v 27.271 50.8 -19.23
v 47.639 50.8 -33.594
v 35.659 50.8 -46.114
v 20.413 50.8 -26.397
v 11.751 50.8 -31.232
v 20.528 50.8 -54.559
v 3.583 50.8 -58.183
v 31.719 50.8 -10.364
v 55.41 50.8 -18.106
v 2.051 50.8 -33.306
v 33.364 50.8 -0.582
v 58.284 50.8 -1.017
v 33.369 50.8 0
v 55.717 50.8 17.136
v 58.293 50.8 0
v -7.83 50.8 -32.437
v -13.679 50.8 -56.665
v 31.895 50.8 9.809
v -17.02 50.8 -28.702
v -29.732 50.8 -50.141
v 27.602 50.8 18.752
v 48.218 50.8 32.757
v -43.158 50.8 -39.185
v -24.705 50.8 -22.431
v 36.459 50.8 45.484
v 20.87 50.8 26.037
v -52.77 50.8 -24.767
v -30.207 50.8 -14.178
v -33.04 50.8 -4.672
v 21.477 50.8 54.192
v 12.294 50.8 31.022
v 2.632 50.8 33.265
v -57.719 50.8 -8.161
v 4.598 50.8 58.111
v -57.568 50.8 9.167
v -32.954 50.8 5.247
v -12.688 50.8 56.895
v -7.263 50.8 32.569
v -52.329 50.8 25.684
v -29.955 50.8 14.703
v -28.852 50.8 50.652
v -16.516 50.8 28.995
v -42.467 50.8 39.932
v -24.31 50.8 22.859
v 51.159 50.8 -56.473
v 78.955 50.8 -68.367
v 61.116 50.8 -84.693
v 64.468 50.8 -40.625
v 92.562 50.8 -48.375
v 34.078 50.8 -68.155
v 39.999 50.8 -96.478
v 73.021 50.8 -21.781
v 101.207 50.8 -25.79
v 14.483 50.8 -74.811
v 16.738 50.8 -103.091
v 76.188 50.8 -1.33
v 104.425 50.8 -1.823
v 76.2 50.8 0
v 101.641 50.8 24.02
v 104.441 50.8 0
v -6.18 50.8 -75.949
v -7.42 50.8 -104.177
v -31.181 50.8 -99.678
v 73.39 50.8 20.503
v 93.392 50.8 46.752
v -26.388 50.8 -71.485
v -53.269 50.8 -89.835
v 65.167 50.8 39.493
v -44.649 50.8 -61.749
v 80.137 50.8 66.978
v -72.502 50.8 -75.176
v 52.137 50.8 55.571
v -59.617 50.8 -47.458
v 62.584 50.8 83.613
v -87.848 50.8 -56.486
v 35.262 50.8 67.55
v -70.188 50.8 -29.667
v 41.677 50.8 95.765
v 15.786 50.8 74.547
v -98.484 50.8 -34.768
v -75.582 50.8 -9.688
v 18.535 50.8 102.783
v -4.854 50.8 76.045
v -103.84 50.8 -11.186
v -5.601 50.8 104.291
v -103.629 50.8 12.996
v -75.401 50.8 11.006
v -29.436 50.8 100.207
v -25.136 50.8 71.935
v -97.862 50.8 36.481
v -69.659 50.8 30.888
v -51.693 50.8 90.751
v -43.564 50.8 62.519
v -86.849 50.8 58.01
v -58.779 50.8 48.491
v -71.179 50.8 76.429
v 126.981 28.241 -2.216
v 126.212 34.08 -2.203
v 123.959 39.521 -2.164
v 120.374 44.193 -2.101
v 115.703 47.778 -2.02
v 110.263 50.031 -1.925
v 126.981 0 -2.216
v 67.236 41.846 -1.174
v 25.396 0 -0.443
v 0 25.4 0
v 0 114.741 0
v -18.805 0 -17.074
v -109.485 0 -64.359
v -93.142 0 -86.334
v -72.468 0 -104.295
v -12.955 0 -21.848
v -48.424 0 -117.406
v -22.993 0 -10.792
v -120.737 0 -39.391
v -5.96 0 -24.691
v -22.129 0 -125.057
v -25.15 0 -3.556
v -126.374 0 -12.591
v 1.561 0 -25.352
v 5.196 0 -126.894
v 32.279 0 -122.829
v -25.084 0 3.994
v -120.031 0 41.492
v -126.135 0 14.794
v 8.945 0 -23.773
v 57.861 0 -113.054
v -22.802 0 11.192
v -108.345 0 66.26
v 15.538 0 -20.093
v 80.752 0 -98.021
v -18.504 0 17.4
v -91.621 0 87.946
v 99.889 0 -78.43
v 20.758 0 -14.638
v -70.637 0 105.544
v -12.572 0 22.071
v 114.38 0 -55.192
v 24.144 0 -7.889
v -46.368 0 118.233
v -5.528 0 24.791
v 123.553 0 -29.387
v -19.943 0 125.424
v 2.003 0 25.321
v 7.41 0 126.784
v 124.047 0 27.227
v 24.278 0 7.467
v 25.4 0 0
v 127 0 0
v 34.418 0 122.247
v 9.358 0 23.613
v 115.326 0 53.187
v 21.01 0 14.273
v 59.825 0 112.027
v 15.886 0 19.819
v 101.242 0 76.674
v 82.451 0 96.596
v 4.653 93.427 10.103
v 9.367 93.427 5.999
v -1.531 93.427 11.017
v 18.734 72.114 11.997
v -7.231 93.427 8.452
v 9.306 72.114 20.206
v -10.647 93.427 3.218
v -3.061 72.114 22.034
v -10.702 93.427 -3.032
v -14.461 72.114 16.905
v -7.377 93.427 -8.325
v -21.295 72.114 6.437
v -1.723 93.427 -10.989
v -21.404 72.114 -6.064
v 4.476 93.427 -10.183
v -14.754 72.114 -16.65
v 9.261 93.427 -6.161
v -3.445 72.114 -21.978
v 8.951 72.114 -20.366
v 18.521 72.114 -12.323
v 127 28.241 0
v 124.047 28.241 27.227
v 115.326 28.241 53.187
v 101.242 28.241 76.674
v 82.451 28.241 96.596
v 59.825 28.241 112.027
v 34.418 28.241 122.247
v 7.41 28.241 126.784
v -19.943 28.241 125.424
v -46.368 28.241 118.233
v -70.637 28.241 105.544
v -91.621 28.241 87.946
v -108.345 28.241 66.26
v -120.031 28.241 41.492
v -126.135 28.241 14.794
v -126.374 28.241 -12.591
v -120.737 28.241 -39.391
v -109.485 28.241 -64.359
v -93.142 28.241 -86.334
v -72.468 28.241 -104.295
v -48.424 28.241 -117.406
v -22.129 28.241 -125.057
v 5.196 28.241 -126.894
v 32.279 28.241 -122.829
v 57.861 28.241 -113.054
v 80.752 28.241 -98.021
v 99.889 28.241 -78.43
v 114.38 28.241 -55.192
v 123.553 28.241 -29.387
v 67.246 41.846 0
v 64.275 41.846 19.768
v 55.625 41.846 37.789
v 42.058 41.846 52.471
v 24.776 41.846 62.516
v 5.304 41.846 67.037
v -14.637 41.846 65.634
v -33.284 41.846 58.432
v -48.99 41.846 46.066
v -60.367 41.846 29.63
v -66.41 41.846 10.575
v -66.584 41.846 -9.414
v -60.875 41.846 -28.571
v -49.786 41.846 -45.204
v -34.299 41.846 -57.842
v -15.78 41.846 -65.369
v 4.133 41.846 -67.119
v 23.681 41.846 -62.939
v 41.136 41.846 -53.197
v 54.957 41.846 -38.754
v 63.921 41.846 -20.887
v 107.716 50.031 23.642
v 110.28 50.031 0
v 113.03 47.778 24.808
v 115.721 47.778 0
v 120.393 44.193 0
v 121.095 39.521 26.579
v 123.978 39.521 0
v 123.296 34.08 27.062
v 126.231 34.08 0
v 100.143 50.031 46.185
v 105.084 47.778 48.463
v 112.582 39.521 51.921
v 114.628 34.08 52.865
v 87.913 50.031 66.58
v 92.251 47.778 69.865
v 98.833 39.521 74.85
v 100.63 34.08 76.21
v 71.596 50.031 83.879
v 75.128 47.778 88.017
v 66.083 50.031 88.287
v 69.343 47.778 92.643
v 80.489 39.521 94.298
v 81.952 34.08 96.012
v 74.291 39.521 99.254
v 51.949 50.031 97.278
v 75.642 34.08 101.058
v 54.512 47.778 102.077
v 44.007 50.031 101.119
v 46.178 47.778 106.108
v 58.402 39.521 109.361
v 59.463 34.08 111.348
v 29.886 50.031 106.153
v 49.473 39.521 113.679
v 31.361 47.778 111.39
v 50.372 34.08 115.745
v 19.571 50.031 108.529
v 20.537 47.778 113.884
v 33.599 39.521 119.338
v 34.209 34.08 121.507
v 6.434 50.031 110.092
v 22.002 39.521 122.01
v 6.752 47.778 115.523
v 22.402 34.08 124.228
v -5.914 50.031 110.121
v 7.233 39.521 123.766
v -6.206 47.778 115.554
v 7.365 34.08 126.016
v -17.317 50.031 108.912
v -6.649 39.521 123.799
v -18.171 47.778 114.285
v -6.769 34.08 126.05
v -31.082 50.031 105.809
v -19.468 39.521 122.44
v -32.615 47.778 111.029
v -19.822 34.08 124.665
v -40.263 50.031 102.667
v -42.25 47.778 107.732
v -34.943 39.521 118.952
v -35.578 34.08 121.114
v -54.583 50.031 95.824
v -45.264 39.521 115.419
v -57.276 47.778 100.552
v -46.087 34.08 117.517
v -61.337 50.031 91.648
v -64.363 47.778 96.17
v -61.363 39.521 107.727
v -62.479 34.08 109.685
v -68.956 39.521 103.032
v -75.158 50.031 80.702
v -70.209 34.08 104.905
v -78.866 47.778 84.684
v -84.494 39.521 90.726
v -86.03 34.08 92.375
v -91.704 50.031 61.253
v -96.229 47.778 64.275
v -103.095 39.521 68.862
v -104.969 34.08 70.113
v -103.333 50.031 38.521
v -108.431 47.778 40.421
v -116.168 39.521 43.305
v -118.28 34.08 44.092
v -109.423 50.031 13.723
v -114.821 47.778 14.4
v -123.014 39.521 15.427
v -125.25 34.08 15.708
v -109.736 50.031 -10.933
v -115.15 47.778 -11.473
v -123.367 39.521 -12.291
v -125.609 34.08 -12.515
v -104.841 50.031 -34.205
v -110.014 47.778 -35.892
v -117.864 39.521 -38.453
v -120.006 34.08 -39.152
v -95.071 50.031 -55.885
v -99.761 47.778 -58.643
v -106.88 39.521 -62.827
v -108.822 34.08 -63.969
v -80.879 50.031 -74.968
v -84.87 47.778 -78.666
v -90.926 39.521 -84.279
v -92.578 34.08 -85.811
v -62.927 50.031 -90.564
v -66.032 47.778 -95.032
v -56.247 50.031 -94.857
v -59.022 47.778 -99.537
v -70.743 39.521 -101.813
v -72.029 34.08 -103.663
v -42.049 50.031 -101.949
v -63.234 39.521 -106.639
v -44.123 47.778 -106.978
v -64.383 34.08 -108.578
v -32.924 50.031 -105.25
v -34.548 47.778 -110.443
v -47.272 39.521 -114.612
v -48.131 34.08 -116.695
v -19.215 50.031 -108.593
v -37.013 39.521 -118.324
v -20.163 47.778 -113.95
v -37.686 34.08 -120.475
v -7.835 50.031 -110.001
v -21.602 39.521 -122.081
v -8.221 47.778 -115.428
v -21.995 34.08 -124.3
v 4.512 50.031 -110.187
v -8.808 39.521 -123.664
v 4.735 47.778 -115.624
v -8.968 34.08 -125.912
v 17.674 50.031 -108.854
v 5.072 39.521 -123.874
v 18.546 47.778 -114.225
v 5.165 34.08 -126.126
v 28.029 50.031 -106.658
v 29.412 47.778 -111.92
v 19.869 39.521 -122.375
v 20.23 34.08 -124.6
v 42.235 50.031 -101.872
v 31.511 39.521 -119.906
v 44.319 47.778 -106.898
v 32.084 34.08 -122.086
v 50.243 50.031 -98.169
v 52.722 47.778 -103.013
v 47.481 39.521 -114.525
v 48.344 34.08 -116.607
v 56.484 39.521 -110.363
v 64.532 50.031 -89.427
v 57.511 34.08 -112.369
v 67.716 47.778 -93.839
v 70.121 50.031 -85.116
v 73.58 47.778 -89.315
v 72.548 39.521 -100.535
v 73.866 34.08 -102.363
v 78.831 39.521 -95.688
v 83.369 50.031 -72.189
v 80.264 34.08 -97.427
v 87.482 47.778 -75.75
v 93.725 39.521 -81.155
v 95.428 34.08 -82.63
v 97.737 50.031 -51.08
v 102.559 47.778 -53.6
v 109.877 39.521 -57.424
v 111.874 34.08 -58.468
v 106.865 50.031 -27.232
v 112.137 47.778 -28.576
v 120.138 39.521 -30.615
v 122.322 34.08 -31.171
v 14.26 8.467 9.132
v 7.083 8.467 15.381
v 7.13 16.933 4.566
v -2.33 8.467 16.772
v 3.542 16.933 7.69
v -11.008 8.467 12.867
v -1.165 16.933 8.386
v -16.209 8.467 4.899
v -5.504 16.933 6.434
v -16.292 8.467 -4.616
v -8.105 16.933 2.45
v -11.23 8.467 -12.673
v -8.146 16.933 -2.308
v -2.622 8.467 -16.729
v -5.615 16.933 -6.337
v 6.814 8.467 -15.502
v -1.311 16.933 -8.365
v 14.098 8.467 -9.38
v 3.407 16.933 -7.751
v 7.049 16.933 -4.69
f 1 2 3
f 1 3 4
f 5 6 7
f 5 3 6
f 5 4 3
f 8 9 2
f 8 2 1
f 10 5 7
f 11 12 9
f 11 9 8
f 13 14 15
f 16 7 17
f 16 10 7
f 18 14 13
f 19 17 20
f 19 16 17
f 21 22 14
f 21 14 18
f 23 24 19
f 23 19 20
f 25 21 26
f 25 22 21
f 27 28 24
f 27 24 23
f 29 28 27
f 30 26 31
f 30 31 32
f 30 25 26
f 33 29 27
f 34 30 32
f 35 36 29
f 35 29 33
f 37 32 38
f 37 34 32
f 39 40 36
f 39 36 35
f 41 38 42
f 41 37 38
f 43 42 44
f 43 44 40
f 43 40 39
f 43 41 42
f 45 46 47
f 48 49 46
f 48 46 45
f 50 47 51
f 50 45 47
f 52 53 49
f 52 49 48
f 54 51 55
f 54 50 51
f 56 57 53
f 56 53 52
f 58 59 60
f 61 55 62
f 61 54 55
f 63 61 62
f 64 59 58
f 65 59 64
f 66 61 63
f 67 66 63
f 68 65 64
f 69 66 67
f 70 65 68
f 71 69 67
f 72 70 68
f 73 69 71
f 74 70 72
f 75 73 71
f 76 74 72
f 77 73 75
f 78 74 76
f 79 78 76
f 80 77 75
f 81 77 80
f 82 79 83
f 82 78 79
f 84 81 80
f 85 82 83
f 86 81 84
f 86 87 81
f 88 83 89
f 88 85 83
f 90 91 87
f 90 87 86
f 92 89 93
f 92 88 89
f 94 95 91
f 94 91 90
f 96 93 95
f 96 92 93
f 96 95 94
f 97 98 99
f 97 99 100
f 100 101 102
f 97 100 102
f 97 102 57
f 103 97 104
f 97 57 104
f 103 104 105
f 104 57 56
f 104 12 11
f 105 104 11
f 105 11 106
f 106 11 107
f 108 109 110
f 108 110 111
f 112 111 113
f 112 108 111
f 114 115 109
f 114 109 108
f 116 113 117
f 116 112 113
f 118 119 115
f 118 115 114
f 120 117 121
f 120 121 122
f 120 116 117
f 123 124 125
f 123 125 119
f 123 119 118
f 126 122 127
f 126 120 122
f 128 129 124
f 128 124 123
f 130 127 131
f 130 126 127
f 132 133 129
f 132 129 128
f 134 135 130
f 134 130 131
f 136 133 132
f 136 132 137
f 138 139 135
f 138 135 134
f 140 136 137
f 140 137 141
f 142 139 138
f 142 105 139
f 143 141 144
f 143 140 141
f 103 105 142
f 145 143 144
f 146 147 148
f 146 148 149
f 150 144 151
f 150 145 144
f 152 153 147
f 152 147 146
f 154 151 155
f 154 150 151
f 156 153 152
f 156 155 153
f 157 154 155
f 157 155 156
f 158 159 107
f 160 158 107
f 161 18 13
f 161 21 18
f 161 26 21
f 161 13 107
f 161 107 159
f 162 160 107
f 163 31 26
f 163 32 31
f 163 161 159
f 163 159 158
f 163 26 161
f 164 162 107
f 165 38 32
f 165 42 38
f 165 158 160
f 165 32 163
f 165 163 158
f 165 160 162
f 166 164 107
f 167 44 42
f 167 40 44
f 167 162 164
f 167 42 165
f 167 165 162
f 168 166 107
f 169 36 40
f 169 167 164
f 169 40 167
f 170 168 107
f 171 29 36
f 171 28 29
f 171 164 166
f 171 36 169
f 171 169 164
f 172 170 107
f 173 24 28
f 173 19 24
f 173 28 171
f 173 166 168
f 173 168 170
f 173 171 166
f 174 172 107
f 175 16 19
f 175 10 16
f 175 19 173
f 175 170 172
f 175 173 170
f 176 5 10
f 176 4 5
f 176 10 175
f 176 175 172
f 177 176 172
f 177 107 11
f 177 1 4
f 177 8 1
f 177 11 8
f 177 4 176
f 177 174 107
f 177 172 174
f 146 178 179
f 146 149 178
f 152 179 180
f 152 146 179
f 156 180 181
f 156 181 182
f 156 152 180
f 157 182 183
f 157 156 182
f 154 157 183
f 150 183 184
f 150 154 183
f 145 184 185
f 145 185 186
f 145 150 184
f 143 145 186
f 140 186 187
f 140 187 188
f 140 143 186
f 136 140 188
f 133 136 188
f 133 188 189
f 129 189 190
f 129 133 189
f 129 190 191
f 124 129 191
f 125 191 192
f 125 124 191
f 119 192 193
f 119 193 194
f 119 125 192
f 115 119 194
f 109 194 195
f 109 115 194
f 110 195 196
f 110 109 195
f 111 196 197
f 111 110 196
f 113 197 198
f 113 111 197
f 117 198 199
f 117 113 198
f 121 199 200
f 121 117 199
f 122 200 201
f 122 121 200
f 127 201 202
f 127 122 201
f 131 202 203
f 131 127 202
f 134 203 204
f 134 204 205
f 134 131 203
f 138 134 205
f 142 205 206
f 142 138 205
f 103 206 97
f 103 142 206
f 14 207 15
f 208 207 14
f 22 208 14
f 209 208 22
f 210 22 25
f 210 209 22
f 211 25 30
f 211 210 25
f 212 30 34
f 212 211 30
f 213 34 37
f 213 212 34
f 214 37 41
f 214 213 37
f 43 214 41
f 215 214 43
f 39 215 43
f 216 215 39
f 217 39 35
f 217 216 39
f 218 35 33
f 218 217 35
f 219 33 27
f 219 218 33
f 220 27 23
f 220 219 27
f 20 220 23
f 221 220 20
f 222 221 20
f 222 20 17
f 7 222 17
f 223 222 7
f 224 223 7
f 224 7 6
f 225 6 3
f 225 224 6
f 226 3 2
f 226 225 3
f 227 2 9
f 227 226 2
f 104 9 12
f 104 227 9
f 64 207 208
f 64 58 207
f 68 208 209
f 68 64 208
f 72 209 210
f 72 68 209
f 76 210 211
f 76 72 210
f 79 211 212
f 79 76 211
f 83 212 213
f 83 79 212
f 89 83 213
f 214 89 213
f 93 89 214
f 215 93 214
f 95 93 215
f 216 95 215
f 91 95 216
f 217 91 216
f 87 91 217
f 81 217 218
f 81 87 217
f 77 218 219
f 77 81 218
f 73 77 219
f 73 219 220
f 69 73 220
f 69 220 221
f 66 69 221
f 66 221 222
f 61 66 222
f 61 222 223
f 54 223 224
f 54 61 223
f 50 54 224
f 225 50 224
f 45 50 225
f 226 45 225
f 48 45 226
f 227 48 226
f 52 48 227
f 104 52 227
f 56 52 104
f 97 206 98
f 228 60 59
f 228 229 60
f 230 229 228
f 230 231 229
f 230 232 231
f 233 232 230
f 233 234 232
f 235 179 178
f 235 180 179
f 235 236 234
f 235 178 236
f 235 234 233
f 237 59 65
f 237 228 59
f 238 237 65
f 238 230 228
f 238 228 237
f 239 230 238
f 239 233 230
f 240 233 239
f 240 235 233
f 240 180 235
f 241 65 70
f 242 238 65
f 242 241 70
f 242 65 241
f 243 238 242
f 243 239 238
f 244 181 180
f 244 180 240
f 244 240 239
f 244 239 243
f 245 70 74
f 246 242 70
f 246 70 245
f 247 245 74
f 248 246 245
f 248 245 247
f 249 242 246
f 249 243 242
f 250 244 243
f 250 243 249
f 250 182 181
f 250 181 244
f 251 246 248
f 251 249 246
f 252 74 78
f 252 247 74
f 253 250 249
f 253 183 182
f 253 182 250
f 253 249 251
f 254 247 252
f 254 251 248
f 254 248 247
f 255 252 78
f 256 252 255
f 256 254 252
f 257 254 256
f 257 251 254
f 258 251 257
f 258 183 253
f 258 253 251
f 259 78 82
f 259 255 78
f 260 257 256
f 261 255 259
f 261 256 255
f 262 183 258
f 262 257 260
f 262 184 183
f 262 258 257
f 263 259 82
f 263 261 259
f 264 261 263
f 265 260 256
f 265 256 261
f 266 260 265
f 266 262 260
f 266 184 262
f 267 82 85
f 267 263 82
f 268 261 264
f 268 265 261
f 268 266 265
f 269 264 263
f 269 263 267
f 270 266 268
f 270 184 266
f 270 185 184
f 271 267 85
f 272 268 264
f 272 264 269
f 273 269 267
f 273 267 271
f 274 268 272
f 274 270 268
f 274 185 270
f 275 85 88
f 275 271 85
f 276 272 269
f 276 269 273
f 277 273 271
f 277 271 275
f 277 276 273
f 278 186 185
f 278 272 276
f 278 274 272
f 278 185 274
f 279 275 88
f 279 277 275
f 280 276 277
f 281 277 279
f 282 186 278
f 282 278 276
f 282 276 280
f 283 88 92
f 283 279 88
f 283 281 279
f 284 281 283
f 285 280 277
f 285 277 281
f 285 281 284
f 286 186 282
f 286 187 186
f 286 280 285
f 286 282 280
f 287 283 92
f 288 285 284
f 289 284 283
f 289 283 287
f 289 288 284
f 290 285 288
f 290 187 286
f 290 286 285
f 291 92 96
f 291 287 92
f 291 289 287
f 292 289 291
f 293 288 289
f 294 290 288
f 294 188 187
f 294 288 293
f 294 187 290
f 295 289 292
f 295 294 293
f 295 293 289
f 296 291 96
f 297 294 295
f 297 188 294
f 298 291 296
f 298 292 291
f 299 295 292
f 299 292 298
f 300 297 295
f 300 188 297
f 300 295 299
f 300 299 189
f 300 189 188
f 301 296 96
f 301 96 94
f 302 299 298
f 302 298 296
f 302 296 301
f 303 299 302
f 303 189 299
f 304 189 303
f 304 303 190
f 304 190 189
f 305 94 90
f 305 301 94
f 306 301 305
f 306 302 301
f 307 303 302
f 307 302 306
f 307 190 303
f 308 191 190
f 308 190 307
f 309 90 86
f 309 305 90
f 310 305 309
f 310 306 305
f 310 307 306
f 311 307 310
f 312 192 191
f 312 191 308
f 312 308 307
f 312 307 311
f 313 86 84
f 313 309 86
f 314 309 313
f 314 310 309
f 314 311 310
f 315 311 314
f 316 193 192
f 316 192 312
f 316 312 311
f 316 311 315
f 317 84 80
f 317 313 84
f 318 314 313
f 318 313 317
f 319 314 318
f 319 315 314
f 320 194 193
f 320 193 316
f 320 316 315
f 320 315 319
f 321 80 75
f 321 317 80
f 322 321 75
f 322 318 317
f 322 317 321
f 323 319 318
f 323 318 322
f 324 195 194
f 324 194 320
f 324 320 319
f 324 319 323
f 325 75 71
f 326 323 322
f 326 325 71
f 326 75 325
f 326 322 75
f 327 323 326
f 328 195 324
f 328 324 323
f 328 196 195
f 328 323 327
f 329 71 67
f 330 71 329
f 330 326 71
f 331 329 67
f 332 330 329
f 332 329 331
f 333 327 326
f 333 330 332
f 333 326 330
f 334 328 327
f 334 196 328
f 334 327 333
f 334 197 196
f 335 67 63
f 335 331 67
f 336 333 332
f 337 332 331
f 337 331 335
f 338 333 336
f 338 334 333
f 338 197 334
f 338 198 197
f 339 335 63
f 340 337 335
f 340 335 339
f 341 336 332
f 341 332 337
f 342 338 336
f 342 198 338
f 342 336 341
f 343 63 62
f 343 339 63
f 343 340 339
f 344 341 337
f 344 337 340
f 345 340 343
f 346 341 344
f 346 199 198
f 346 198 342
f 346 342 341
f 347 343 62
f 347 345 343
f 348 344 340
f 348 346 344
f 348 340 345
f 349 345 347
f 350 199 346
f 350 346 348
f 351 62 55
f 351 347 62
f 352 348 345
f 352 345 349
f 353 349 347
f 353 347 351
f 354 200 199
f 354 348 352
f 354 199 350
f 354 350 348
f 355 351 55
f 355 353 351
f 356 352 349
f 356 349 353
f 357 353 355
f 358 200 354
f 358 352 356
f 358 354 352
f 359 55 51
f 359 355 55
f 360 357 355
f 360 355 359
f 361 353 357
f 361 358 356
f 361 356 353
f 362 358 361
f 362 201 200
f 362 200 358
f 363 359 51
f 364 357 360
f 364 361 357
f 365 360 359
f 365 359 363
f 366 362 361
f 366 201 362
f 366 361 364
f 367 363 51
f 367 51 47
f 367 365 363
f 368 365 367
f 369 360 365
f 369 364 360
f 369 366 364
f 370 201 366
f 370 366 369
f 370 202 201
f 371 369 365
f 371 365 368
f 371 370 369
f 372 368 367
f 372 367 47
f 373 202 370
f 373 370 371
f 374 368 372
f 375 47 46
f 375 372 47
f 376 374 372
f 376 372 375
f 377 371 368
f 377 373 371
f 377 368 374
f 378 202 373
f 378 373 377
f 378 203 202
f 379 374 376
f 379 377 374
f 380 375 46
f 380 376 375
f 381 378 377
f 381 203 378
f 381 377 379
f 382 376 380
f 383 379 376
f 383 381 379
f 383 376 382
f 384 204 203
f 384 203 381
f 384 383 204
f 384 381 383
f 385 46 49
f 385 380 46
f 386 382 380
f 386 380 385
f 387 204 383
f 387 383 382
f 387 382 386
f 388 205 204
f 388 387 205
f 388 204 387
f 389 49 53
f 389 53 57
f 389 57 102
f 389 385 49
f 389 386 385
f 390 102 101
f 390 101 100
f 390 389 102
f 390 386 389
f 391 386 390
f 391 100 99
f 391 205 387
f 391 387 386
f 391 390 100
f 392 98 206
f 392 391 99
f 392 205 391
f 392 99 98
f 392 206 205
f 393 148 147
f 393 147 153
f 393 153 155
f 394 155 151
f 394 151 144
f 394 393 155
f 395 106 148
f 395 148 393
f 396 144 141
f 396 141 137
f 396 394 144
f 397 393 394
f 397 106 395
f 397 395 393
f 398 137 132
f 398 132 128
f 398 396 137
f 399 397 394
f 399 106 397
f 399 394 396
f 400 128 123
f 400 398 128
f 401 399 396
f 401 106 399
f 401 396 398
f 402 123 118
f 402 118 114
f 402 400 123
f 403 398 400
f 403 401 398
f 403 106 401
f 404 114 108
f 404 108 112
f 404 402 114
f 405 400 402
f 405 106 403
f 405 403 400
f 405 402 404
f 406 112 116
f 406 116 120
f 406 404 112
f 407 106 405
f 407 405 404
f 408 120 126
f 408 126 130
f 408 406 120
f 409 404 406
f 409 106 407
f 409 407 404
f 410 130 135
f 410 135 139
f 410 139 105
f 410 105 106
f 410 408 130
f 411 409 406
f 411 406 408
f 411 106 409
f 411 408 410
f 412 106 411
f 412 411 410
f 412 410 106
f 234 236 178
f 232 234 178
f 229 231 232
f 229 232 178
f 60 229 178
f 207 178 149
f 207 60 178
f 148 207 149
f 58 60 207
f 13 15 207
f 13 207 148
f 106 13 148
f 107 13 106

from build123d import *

# Parameters (mm, degrees)
REVOLVE3_ANGLE = 359


with BuildPart() as part:
    # Sketch1 → Revolve3 (revolve)
    with BuildSketch(Plane.XY):
        with BuildLine():
            Line((25.4, 0), (0, 25.4))
            Line((0, 25.4), (0, 114.740562784))
            Line((0, 114.740562784), (33.369066404, 50.8))
            Line((33.369066404, 50.8), (58.29289998, 50.8))
            Line((58.29289998, 50.8), (67.24644999, 41.84644999))
            Line((67.24644999, 41.84644999), (76.2, 50.8))
            Line((76.2, 50.8), (104.441096188, 50.8))
            ThreePointArc((104.441096188, 50.8), (120.39265005, 44.19265005), (127, 28.241096188))
            Line((127, 28.241096188), (127, 0))
            Line((127, 0), (25.4, 0))
        make_face()
    revolve(axis=Axis((0, 25.4, 0), (0, -1, 0)), revolution_arc=REVOLVE3_ANGLE)


solid = part.part
